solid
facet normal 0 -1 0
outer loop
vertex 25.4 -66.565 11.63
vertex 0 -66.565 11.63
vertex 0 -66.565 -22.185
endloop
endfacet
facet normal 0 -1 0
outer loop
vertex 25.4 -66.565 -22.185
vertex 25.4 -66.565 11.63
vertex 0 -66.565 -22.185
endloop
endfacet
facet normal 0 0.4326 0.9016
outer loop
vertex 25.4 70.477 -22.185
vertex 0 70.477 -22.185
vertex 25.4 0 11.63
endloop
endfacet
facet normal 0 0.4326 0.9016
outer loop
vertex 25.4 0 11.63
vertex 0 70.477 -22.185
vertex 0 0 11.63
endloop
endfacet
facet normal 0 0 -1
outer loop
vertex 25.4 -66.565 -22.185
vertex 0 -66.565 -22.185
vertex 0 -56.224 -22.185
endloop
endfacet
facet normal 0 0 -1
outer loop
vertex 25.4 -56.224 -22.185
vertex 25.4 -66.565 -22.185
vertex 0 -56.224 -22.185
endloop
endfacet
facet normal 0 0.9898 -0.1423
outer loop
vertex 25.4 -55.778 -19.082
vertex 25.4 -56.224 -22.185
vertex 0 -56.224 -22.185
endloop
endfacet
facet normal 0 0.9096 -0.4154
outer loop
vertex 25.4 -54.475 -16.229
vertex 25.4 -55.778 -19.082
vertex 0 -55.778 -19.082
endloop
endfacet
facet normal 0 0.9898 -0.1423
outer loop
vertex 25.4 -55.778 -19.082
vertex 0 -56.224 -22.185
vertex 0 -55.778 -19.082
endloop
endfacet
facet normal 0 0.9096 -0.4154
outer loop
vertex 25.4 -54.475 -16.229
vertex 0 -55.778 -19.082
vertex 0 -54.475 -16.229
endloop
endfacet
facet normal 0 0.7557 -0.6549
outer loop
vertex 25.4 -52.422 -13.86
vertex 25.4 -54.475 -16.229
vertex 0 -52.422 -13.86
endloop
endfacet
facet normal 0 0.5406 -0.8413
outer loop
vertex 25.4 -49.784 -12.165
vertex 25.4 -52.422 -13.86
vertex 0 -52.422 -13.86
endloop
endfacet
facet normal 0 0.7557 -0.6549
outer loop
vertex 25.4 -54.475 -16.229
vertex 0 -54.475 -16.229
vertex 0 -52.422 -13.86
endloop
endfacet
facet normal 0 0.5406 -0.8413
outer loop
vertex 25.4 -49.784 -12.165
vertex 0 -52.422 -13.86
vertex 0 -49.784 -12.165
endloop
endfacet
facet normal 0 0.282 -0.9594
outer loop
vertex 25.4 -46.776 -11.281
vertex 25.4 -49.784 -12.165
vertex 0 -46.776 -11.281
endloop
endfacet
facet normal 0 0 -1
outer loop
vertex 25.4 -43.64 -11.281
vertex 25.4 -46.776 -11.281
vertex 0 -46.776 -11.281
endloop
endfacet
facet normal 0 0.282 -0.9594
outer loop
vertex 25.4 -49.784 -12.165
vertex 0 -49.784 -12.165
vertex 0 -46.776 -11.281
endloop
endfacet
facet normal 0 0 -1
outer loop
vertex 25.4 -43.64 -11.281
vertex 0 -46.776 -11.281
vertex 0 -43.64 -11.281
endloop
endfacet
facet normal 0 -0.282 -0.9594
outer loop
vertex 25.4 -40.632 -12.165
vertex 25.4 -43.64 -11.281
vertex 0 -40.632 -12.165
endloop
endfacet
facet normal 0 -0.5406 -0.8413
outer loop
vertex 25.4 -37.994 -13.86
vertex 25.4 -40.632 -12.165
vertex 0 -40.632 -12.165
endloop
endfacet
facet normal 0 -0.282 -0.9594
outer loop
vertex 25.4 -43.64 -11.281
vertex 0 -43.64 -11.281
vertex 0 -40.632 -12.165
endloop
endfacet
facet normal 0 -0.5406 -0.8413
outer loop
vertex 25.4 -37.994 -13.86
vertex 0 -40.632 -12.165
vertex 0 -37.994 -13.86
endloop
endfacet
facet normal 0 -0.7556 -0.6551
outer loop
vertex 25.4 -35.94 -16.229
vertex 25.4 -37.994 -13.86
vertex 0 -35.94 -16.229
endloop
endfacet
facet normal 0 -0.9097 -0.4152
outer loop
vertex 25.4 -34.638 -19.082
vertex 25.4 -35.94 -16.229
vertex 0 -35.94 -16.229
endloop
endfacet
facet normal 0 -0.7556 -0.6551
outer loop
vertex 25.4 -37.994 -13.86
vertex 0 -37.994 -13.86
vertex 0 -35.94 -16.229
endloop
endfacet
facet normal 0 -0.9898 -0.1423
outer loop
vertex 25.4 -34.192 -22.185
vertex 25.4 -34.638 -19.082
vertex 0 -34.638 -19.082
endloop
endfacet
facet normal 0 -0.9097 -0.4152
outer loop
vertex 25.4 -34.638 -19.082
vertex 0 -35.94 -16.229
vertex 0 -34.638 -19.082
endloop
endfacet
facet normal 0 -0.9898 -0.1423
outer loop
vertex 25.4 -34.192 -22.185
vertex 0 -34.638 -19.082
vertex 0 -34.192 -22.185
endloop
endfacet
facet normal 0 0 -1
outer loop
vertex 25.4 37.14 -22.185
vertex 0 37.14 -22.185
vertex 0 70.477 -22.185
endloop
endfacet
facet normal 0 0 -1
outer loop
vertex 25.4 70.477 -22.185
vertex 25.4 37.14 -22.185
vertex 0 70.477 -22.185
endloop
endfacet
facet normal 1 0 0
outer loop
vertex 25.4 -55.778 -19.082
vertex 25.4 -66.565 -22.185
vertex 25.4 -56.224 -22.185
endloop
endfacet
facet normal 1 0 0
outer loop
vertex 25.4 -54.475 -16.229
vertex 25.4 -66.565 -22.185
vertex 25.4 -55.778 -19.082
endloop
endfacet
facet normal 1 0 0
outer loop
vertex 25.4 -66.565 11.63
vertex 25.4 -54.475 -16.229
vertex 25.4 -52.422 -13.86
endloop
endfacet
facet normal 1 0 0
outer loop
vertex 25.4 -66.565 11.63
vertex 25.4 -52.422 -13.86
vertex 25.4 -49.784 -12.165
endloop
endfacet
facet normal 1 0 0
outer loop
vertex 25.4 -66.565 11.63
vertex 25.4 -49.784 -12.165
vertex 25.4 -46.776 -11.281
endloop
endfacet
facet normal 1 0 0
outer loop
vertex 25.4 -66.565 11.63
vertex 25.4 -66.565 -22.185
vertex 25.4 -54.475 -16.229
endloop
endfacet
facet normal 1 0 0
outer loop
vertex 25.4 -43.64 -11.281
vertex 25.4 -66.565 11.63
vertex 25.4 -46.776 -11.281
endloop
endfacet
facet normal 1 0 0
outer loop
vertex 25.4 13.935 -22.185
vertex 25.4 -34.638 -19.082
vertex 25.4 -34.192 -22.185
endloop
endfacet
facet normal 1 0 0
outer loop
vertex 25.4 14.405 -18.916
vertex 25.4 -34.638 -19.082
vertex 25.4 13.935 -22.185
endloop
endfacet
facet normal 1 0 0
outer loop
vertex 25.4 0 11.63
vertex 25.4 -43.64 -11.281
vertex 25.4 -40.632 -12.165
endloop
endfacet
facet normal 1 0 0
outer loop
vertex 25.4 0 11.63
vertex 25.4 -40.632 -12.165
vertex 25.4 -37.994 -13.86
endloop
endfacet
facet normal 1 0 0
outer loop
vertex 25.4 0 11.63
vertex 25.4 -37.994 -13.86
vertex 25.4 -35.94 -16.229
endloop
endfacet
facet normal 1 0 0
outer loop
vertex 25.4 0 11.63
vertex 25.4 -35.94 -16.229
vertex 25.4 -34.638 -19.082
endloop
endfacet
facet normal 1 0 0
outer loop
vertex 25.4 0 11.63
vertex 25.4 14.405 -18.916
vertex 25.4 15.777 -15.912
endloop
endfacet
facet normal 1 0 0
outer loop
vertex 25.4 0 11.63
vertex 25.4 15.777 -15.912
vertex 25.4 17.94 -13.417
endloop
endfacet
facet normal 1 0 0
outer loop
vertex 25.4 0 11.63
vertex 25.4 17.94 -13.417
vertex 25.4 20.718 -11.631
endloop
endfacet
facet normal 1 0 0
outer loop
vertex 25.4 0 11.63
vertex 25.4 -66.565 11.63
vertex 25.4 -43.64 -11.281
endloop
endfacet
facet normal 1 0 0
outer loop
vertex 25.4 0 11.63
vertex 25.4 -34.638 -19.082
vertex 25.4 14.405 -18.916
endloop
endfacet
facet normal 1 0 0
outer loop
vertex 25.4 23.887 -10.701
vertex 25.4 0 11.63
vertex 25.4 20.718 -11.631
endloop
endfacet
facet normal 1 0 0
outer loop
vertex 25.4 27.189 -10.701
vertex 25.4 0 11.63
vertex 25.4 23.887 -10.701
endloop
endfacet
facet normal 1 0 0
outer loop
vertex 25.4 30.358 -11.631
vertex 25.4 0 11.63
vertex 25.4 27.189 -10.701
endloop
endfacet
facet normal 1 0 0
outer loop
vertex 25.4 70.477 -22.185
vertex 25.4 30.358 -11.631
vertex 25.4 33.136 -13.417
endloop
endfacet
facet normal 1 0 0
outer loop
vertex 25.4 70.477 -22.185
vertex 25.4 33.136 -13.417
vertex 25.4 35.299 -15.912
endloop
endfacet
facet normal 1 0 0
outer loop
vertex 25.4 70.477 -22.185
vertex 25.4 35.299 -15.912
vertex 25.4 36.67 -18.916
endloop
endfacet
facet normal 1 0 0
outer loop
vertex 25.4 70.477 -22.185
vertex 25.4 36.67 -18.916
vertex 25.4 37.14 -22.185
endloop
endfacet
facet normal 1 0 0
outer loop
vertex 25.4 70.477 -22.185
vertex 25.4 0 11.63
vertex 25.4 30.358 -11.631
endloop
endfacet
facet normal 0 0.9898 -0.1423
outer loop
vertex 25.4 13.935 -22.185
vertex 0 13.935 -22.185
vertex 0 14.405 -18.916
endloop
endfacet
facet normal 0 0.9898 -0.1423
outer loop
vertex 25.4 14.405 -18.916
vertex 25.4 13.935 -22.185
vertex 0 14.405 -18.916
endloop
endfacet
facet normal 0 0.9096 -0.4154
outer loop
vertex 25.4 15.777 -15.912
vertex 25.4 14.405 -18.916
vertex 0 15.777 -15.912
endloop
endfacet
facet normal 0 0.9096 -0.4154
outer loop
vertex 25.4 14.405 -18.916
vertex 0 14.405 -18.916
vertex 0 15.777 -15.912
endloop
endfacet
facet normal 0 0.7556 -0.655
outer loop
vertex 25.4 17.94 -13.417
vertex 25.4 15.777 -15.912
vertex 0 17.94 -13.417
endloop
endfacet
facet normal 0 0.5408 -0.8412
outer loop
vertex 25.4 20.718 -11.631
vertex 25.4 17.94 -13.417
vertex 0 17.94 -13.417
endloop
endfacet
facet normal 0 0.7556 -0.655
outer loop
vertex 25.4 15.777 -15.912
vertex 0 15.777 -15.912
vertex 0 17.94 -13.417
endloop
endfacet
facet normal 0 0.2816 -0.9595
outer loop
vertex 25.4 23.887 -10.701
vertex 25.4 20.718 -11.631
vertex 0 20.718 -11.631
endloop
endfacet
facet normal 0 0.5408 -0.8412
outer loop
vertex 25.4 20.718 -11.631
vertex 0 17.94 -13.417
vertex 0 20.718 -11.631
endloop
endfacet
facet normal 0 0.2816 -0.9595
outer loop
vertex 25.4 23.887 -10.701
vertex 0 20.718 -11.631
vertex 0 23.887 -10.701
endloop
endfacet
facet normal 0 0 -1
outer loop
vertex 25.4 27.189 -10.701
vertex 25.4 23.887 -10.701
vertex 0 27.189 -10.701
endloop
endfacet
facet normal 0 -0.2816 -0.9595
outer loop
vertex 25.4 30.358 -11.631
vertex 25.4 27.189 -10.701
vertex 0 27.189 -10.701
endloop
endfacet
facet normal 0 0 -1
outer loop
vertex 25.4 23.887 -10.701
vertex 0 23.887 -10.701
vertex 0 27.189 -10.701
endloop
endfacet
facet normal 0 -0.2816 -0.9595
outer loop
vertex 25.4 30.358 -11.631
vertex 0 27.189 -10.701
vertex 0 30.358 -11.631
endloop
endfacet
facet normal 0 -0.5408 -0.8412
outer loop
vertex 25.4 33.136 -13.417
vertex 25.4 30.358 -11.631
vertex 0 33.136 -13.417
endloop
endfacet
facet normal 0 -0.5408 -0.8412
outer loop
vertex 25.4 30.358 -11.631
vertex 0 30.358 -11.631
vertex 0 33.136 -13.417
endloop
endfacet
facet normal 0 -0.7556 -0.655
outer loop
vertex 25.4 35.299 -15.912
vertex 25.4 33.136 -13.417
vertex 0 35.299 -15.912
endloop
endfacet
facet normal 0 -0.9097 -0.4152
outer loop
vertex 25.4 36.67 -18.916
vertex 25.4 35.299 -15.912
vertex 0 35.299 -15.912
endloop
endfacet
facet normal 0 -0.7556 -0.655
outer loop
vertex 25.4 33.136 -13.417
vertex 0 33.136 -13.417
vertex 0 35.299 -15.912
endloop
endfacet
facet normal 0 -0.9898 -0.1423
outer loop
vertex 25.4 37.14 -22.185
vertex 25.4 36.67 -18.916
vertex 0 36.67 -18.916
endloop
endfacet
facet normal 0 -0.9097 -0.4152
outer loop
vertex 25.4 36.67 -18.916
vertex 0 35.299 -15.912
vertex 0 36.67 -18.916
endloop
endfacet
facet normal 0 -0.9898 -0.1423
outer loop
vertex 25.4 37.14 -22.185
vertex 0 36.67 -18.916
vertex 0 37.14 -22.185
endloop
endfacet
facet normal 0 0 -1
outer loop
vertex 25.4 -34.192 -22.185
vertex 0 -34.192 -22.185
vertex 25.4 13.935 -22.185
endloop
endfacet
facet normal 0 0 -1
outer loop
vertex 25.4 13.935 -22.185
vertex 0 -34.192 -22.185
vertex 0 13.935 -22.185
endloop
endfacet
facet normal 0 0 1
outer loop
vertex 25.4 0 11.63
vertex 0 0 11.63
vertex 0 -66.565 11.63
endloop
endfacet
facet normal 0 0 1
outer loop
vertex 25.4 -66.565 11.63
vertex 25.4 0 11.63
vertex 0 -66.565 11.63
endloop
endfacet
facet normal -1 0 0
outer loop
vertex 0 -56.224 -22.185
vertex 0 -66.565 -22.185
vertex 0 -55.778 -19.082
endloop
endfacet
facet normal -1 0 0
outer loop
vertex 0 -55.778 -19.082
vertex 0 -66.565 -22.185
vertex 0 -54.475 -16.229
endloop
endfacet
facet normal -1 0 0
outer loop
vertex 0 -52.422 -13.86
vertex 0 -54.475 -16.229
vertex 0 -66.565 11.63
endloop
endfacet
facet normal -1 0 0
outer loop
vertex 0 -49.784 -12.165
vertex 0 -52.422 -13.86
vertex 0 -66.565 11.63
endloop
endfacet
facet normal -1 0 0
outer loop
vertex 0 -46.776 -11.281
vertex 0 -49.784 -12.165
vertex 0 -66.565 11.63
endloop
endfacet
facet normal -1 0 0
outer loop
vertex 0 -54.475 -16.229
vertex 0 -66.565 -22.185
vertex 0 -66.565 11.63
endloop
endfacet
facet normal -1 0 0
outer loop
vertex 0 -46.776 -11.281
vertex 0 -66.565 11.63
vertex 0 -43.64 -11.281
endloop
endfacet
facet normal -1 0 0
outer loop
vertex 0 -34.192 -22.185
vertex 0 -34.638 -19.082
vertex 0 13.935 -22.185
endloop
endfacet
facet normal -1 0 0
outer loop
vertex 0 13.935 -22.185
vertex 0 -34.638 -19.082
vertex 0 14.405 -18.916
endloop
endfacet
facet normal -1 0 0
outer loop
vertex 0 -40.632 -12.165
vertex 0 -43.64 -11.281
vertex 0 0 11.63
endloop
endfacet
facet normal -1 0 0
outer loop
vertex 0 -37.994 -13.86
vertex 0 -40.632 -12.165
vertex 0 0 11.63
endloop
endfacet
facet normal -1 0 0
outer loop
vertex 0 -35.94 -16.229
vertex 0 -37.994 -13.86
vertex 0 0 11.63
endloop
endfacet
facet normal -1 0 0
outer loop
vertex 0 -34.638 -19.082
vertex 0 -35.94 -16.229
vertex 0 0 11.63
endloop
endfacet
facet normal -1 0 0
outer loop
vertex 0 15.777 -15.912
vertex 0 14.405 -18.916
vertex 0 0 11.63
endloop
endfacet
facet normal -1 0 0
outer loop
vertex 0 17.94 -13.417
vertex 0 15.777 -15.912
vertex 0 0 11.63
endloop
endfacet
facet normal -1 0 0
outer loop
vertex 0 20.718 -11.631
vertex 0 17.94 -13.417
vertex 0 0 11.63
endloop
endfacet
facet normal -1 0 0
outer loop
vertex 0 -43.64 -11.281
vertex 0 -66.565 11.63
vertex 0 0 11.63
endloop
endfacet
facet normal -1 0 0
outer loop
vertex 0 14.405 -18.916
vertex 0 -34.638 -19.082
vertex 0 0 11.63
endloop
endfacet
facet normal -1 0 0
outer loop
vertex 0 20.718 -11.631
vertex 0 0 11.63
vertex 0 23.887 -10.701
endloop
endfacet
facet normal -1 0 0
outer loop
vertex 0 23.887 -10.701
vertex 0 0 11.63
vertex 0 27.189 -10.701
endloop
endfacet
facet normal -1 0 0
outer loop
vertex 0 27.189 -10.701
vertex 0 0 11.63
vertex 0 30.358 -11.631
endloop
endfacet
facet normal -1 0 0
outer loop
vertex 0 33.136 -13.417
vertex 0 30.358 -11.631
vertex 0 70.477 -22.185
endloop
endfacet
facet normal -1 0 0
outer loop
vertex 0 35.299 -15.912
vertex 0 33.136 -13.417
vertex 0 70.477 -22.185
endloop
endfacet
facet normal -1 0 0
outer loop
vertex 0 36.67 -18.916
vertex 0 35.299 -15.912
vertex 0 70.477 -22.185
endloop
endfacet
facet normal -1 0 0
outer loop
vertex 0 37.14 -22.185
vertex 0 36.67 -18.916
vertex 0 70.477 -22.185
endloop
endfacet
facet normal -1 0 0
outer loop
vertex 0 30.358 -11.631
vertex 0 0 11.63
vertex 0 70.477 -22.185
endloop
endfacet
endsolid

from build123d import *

# Parameters (mm, degrees)
F1_DEPTH = 25.4


with BuildPart() as f1:
    # F0 (on Right) → F1 (new body)
    with BuildSketch(Plane.YZ):
        with BuildLine():
            Line((0, 11.630322), (-66.565119, 11.630322))
            Line((-66.565119, 11.630322), (-66.565119, -22.185242))
            Line((-66.565119, -22.185242), (-56.224159, -22.185242))
            ThreePointArc((-56.224159, -22.185242), (-45.207921, -11.169004), (-34.191684, -22.185242))
            Line((-34.191684, -22.185242), (13.935136, -22.185242))
            ThreePointArc((13.935136, -22.185242), (25.537794, -10.582583), (37.140453, -22.185242))
            Line((37.140453, -22.185242), (70.476905, -22.185242))
            Line((70.476905, -22.185242), (0, 11.630322))
        make_face()
    extrude(amount=F1_DEPTH)


solid = f1.part
